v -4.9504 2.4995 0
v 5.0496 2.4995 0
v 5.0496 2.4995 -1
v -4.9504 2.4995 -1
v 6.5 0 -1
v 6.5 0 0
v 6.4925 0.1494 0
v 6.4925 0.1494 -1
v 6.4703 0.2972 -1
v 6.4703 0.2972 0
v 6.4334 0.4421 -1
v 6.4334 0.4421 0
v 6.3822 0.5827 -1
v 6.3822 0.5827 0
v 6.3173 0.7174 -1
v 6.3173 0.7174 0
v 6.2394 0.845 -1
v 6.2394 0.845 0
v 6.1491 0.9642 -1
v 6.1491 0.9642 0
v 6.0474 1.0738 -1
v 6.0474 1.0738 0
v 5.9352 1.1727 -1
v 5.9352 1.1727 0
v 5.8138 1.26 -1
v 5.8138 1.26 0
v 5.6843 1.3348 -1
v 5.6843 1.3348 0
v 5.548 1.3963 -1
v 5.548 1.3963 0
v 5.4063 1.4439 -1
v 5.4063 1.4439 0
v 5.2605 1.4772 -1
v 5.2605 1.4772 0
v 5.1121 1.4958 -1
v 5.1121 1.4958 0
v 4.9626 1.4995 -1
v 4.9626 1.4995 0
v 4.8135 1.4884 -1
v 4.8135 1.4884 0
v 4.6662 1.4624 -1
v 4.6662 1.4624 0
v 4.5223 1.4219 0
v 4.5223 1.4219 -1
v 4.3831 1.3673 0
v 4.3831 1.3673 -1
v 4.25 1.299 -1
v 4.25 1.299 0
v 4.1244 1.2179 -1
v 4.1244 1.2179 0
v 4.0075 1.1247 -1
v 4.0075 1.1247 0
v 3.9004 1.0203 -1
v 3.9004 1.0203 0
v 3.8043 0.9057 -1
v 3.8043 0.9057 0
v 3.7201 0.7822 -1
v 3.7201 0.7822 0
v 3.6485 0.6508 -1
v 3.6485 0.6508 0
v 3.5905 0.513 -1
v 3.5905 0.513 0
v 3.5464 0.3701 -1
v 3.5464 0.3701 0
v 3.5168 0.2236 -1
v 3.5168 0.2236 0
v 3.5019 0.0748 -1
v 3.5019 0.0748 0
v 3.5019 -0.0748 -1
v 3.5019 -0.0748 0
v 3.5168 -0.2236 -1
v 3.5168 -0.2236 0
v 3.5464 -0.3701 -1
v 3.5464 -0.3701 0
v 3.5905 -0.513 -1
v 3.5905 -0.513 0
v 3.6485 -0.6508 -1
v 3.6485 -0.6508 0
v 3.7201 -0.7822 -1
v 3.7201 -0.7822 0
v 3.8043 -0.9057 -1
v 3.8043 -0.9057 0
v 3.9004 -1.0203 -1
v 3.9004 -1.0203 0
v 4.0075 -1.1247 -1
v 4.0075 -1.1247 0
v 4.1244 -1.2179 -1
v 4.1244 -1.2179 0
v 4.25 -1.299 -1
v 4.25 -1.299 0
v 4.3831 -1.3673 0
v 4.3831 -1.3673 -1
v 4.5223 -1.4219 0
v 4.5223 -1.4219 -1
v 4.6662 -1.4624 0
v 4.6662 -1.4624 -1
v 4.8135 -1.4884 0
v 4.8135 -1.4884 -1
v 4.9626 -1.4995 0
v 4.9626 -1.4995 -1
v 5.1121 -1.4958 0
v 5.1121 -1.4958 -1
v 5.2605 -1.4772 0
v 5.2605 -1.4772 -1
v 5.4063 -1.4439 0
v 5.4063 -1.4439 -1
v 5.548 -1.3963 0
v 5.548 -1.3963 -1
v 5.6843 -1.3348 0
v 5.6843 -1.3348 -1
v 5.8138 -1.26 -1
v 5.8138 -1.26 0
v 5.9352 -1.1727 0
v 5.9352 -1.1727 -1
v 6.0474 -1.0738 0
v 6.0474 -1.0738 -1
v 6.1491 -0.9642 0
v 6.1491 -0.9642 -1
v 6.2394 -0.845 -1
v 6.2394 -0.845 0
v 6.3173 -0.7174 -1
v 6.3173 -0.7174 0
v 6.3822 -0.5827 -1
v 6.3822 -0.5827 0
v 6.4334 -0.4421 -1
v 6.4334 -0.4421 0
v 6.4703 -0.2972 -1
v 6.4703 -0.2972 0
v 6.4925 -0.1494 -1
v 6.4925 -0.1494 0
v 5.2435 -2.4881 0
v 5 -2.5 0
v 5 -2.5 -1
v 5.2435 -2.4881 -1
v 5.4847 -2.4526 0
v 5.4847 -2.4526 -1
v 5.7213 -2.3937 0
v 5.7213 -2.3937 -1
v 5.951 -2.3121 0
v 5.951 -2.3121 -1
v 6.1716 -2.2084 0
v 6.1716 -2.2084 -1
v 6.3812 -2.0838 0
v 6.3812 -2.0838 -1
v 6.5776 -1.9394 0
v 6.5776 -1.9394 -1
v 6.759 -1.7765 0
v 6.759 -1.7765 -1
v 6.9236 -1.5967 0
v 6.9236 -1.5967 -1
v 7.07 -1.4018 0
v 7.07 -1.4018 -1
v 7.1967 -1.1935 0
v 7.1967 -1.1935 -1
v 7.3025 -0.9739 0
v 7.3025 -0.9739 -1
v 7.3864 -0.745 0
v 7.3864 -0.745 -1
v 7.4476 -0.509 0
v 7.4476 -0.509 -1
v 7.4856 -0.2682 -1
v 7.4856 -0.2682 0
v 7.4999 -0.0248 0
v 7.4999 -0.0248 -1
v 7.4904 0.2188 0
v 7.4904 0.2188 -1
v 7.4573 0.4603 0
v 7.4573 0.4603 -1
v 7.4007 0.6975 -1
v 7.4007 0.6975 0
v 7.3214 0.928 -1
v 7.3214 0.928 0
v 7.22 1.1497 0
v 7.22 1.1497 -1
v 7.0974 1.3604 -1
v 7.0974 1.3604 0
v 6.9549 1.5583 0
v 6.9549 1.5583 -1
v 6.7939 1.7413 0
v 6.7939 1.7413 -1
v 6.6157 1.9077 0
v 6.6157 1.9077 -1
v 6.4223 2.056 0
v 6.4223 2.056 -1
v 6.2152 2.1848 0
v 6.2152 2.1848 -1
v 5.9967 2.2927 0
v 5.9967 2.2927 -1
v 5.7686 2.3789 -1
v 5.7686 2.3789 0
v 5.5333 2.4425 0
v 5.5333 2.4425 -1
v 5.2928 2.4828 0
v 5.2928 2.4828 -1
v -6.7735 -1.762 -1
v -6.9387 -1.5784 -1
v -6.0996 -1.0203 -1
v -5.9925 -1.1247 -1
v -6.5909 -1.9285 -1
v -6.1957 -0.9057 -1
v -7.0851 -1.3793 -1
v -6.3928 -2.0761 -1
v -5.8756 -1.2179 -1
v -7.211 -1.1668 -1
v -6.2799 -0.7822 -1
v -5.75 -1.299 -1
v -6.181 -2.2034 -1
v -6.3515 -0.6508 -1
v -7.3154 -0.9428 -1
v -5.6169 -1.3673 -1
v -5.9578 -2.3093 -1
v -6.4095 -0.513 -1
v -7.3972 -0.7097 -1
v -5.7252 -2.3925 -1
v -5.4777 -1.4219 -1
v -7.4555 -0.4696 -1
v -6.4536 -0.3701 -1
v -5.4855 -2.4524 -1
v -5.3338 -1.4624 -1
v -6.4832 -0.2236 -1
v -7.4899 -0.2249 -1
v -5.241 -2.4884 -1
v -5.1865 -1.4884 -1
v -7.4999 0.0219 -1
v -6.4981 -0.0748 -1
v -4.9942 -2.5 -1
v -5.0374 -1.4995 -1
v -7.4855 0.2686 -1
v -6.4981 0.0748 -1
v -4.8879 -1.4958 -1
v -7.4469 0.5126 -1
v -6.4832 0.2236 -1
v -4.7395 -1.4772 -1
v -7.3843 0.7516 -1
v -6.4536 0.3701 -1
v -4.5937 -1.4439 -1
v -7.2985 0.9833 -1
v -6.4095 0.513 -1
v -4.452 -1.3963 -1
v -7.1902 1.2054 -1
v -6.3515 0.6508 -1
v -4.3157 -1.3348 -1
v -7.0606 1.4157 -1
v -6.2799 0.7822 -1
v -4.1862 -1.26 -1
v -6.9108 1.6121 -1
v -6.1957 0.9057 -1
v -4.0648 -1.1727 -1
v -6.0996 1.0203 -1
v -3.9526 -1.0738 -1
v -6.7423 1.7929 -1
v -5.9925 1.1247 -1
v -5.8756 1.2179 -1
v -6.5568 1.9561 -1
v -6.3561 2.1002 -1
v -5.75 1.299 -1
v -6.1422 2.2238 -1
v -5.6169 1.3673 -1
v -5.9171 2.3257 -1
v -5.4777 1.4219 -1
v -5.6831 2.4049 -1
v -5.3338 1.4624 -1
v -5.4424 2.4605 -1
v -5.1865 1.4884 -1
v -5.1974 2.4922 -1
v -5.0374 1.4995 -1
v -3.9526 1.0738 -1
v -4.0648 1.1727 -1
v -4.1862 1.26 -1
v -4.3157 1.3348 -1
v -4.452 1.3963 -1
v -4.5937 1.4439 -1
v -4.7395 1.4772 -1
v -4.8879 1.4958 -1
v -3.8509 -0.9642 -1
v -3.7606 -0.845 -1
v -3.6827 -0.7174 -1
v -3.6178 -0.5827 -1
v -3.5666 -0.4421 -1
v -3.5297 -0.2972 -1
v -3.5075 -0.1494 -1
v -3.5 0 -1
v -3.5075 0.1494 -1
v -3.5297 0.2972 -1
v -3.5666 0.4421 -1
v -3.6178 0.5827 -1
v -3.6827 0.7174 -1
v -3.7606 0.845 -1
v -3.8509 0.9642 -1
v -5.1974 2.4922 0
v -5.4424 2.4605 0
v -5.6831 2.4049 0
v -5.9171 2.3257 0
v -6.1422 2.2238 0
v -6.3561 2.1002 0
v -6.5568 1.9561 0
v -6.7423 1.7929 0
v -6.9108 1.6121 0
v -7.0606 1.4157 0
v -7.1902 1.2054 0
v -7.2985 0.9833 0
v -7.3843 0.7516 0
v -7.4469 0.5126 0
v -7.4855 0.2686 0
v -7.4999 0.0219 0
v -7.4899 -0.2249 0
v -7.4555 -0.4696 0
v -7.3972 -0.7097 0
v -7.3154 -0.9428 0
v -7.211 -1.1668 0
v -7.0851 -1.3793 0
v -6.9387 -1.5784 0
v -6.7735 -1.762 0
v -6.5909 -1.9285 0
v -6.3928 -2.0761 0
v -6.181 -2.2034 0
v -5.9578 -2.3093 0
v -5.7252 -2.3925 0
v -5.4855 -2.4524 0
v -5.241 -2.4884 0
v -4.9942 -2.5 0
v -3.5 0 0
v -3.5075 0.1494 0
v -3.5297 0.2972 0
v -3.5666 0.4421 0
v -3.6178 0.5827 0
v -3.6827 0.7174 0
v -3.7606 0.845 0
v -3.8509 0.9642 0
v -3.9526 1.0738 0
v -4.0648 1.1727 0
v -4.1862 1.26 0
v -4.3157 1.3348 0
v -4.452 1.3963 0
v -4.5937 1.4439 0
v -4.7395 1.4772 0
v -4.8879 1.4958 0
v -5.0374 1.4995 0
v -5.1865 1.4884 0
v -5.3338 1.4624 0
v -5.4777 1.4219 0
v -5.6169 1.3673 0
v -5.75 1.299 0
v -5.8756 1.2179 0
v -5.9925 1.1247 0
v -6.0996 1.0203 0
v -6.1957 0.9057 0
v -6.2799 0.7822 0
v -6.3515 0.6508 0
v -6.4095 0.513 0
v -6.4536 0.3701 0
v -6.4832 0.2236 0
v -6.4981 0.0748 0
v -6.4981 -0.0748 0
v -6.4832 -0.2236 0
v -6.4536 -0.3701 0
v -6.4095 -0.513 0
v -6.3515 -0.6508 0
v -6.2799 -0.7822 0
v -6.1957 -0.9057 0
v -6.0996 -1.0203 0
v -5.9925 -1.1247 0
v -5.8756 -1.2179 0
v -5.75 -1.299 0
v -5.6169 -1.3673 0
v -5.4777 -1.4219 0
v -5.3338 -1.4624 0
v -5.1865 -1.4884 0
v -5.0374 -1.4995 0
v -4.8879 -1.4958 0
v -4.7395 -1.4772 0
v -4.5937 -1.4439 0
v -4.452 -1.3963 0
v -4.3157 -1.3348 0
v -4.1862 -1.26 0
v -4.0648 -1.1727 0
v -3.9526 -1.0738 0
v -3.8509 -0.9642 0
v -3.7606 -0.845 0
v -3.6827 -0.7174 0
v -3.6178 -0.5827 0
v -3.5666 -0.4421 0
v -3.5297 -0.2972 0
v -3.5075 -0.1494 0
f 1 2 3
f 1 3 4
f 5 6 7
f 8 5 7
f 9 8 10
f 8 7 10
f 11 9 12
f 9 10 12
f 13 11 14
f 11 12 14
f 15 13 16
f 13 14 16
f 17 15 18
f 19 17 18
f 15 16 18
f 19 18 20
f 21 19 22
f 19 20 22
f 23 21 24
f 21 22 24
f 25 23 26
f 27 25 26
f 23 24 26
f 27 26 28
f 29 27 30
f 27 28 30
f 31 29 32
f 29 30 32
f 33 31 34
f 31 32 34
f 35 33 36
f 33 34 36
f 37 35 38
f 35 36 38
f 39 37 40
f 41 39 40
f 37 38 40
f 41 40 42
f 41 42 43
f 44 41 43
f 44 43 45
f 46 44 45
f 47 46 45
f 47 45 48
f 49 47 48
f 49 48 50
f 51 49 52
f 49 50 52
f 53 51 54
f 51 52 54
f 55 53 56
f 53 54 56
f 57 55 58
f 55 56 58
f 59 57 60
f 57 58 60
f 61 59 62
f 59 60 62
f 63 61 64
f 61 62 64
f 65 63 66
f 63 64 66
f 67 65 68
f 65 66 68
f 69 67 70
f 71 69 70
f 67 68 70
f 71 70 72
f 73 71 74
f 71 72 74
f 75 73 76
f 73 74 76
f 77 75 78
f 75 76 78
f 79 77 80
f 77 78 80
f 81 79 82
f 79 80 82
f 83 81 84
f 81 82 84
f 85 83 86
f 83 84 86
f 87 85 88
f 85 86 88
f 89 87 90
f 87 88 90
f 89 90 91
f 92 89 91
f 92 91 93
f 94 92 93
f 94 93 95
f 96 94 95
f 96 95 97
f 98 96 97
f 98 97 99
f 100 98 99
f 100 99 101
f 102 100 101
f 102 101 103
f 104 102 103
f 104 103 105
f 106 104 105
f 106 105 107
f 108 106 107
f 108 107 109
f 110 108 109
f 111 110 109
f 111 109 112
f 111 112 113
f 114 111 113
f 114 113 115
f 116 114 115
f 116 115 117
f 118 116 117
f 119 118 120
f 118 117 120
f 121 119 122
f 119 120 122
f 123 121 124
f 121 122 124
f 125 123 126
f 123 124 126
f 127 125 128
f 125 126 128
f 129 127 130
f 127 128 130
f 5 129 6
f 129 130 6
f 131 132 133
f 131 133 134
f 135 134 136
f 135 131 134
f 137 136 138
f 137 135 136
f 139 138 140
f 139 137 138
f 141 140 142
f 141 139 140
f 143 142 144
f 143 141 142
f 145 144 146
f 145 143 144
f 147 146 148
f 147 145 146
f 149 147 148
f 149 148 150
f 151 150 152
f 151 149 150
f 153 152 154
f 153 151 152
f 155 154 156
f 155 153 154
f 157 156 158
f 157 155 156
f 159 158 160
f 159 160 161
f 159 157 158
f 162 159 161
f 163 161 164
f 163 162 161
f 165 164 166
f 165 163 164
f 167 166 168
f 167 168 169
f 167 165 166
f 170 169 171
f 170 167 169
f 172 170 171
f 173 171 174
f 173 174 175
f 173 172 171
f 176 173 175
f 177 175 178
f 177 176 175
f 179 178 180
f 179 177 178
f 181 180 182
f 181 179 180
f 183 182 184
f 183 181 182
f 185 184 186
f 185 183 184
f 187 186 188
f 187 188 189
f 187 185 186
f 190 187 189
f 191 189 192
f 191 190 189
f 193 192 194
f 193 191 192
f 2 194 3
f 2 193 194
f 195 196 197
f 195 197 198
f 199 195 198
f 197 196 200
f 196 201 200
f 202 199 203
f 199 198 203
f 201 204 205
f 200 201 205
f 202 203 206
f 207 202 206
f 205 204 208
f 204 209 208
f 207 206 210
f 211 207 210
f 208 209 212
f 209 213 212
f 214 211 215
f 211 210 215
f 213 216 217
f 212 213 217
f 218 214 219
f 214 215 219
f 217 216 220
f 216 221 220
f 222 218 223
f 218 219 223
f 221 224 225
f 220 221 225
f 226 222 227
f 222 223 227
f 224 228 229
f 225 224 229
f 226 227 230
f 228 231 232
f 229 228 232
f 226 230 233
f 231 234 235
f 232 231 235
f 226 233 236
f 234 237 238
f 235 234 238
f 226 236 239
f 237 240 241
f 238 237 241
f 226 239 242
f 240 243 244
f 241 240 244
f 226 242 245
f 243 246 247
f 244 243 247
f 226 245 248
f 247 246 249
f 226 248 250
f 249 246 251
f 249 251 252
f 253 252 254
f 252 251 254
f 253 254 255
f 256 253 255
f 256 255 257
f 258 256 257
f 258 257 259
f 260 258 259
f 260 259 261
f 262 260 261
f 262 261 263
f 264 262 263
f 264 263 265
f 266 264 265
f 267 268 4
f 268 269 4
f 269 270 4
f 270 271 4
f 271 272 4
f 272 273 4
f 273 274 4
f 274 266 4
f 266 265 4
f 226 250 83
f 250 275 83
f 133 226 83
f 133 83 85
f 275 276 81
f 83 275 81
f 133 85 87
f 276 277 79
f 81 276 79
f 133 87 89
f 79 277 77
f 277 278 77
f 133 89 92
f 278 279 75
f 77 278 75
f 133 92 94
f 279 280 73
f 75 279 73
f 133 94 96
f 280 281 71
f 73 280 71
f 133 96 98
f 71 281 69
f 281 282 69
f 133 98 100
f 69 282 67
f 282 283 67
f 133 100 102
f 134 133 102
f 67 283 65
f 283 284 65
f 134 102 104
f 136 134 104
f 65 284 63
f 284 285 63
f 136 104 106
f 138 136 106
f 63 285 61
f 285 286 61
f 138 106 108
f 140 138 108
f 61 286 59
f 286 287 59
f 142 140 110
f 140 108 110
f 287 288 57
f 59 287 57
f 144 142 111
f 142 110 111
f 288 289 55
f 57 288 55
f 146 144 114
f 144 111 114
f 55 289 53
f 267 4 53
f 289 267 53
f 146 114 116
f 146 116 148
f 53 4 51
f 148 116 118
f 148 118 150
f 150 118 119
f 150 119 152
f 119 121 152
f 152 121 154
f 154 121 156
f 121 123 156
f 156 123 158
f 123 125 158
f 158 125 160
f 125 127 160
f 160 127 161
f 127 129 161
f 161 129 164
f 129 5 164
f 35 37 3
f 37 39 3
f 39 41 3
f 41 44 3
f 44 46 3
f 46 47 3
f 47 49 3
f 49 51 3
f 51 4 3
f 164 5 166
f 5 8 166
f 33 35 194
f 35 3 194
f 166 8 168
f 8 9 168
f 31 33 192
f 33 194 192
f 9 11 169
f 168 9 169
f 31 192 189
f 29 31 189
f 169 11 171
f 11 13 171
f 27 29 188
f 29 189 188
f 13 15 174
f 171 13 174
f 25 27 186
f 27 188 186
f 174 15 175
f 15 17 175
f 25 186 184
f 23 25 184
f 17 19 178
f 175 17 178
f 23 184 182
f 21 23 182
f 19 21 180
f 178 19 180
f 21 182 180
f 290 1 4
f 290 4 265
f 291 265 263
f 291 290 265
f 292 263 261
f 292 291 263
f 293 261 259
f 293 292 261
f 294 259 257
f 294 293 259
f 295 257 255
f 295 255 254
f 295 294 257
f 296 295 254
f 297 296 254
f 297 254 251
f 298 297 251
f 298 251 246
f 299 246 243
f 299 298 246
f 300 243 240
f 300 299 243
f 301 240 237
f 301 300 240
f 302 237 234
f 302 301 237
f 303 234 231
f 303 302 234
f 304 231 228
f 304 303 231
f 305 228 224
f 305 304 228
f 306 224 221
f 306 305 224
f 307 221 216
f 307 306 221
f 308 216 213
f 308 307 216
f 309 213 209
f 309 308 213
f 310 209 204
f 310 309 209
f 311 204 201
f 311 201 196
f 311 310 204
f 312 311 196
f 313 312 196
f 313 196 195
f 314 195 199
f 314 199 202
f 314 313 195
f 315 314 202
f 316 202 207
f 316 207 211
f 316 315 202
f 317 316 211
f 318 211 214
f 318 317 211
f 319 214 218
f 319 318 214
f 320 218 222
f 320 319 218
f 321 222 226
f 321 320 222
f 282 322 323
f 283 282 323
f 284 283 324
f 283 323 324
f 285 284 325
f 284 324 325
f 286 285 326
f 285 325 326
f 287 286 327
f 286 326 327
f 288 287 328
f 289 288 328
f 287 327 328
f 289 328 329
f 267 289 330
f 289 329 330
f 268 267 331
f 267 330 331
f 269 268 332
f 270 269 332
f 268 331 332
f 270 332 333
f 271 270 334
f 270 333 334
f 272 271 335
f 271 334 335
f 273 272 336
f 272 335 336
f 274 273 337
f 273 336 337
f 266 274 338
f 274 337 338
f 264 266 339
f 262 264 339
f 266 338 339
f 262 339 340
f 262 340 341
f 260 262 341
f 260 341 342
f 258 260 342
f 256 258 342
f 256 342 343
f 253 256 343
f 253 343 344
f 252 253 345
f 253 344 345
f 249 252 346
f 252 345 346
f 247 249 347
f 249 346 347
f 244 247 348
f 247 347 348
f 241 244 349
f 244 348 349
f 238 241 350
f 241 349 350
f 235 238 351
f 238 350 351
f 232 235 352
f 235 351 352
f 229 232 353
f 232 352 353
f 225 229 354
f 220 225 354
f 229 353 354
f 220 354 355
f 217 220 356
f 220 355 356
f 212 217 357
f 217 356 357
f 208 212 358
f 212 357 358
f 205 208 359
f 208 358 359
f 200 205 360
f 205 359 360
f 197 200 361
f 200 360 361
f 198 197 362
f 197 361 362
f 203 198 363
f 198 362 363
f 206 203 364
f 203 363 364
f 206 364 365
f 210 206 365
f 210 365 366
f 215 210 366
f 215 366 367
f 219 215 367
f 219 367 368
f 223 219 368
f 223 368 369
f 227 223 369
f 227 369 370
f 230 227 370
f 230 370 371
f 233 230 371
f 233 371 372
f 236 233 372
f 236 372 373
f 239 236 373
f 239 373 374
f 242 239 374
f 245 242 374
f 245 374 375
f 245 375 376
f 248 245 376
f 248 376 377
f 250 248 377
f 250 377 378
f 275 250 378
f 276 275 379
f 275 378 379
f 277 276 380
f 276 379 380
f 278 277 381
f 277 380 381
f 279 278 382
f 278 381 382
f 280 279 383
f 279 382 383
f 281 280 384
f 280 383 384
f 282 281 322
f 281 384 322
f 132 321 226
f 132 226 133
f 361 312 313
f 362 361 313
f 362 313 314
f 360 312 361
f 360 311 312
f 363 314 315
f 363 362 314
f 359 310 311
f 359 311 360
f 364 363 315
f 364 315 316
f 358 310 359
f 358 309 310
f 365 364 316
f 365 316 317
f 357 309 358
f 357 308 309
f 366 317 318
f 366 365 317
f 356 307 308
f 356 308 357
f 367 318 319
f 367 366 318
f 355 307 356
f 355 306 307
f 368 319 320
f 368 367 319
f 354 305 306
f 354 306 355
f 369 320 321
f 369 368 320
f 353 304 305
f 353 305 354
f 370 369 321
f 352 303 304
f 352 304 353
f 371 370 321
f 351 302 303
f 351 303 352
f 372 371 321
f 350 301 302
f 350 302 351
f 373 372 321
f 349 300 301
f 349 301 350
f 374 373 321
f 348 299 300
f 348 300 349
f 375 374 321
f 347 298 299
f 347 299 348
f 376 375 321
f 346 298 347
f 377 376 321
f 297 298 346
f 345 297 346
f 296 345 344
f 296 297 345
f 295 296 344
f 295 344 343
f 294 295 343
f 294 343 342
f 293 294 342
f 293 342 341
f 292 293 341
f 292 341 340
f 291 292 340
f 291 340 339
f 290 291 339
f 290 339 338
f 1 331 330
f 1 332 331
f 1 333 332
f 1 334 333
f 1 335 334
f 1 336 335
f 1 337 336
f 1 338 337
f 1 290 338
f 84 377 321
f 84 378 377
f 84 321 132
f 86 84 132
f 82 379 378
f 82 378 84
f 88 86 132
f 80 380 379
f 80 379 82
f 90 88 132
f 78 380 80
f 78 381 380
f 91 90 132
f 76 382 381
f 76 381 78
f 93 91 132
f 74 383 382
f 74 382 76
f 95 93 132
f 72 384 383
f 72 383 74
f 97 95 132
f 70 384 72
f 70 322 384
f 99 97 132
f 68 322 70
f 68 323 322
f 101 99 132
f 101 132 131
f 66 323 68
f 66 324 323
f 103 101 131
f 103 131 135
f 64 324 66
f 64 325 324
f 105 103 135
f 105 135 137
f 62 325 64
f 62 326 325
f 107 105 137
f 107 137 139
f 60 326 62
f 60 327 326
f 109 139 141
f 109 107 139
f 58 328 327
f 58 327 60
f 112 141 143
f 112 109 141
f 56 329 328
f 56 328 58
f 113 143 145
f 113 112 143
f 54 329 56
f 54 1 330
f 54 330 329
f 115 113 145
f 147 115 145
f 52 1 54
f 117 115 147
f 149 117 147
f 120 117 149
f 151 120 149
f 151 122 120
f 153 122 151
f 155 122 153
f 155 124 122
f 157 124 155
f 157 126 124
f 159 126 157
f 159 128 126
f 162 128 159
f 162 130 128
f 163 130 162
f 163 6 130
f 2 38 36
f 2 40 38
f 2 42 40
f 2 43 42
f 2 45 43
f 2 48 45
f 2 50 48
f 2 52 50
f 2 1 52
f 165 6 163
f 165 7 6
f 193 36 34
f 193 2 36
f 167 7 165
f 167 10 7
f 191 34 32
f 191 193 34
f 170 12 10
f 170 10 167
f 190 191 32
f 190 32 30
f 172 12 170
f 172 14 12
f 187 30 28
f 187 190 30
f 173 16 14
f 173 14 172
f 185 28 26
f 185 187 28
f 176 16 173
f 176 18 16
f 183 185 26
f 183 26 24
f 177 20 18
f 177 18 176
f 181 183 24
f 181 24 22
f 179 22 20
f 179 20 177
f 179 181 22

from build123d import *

# Parameters (mm, degrees)
F0_R     = 1.5
F1_DEPTH = 1


with BuildPart() as f1:
    # F0 (on Top) → F1 (new body)
    with BuildSketch(Plane.XY):
        with BuildLine():
            Line((4.950397, 2.499508), (-4.950397, 2.499508))
            ThreePointArc((-4.950397, 2.499508), (-7.499904, 0.021927), (-4.994248, -2.499993))
            Line((-4.994248, -2.499993), (4.999998, -2.5))
            ThreePointArc((4.999998, -2.5), (7.499877, -0.024803), (5.049603, 2.499508))
            Line((5.049603, 2.499508), (4.950397, 2.499508))
        make_face()
        with Locations((-5, 0)):
            Circle(F0_R, mode=Mode.SUBTRACT)
        with Locations((5, 0)):
            Circle(F0_R, mode=Mode.SUBTRACT)
    extrude(amount=-F1_DEPTH)


solid = f1.part
